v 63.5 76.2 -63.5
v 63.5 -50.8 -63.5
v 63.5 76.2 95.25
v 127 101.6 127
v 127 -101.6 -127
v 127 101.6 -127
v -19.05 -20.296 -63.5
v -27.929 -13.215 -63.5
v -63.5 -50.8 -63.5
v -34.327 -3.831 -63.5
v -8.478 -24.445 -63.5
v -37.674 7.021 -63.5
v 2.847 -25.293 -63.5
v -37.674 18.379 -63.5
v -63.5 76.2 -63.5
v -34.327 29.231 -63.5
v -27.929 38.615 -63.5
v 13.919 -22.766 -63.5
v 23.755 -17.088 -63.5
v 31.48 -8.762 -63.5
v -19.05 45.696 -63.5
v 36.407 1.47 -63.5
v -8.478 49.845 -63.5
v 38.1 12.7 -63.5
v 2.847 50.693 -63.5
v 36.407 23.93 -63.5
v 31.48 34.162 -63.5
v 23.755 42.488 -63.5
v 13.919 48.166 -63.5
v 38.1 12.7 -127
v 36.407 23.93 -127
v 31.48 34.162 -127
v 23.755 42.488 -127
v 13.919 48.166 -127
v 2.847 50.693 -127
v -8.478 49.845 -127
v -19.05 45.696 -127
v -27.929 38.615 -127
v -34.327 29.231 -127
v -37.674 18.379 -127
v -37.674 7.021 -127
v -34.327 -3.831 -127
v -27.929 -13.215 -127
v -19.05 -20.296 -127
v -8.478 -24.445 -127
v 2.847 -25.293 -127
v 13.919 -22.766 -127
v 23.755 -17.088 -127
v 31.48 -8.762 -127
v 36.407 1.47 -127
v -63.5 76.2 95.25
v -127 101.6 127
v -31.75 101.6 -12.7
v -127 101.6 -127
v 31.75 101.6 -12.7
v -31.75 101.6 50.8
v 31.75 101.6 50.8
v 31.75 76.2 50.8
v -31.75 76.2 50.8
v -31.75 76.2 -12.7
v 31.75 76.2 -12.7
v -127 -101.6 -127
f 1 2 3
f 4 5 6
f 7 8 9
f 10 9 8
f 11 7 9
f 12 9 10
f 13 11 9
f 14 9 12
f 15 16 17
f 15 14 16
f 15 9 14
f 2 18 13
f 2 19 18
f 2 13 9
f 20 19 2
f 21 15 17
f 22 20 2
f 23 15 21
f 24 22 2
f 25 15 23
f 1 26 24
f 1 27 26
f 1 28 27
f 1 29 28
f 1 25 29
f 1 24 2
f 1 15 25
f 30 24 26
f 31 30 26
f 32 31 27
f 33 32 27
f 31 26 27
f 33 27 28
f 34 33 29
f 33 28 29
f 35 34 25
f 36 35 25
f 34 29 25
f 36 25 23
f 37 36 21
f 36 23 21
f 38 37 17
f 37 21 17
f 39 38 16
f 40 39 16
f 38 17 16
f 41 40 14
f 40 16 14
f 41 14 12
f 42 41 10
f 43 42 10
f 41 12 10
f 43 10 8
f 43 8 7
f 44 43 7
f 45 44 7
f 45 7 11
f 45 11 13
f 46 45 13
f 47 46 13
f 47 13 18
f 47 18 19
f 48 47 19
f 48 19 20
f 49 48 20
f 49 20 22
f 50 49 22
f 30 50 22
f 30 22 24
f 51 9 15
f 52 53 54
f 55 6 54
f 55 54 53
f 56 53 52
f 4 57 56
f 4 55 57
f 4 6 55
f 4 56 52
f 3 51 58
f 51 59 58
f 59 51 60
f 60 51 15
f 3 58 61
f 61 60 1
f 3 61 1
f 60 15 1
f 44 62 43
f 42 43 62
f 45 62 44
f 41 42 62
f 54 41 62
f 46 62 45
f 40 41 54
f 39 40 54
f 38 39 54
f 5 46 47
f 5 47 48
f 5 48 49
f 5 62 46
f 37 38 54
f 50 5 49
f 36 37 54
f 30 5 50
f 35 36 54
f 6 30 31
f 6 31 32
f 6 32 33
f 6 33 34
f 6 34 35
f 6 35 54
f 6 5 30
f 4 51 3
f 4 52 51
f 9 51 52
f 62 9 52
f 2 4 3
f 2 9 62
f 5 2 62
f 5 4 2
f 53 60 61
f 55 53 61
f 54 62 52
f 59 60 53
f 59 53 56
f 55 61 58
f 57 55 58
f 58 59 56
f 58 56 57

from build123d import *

# Parameters (mm, degrees)
F3_DEPTH = 127
F1_W     = 127
F1_H     = 127
F1_R     = 38.1
F4_DEPTH = 194.818
F5_DEPTH = 63.5
F6_DEPTH = 281.432
F7_DEPTH = 672.592
F0_W     = 63.5
F0_H     = 63.5
F8_DEPTH = 261.874


with BuildPart() as f3:
    # F2 (on Right) → F3 (new body, symmetric)
    with BuildSketch(Plane.YZ):
        Polygon((-101.6, -127), (101.6, -127), (101.6, 127), align=None)
    extrude(amount=F3_DEPTH, both=True)

    # F1 (on Top) → F4 (cut)
    with BuildSketch(Plane.XY):
        with Locations((0, 12.7)):
            Rectangle(F1_W, F1_H)
        with Locations((0, 12.7)):
            Circle(F1_R, mode=Mode.SUBTRACT)
    extrude(amount=F4_DEPTH, mode=Mode.SUBTRACT)

    # F1 (on Top) → F5 (cut)
    with BuildSketch(Plane.XY):
        with Locations((0, 12.7)):
            Rectangle(F1_W, F1_H)
        with Locations((0, 12.7)):
            Circle(F1_R, mode=Mode.SUBTRACT)
    extrude(amount=-F5_DEPTH, mode=Mode.SUBTRACT)

    # F1 (on Top) → F6 (cut)
    with BuildSketch(Plane.XY):
        with Locations((0, 12.7)):
            Circle(F1_R)
    extrude(amount=-F6_DEPTH, mode=Mode.SUBTRACT)

    # F1 (on Top) → F7 (cut)
    with BuildSketch(Plane.XY):
        with Locations((0, 12.7)):
            Circle(F1_R)
    extrude(amount=F7_DEPTH, mode=Mode.SUBTRACT)

    # F0 (on Front) → F8 (cut)
    with BuildSketch(Plane.XZ):
        with Locations((0, 19.05)):
            Rectangle(F0_W, F0_H)
    extrude(amount=-F8_DEPTH, mode=Mode.SUBTRACT)


solid = f3.part
